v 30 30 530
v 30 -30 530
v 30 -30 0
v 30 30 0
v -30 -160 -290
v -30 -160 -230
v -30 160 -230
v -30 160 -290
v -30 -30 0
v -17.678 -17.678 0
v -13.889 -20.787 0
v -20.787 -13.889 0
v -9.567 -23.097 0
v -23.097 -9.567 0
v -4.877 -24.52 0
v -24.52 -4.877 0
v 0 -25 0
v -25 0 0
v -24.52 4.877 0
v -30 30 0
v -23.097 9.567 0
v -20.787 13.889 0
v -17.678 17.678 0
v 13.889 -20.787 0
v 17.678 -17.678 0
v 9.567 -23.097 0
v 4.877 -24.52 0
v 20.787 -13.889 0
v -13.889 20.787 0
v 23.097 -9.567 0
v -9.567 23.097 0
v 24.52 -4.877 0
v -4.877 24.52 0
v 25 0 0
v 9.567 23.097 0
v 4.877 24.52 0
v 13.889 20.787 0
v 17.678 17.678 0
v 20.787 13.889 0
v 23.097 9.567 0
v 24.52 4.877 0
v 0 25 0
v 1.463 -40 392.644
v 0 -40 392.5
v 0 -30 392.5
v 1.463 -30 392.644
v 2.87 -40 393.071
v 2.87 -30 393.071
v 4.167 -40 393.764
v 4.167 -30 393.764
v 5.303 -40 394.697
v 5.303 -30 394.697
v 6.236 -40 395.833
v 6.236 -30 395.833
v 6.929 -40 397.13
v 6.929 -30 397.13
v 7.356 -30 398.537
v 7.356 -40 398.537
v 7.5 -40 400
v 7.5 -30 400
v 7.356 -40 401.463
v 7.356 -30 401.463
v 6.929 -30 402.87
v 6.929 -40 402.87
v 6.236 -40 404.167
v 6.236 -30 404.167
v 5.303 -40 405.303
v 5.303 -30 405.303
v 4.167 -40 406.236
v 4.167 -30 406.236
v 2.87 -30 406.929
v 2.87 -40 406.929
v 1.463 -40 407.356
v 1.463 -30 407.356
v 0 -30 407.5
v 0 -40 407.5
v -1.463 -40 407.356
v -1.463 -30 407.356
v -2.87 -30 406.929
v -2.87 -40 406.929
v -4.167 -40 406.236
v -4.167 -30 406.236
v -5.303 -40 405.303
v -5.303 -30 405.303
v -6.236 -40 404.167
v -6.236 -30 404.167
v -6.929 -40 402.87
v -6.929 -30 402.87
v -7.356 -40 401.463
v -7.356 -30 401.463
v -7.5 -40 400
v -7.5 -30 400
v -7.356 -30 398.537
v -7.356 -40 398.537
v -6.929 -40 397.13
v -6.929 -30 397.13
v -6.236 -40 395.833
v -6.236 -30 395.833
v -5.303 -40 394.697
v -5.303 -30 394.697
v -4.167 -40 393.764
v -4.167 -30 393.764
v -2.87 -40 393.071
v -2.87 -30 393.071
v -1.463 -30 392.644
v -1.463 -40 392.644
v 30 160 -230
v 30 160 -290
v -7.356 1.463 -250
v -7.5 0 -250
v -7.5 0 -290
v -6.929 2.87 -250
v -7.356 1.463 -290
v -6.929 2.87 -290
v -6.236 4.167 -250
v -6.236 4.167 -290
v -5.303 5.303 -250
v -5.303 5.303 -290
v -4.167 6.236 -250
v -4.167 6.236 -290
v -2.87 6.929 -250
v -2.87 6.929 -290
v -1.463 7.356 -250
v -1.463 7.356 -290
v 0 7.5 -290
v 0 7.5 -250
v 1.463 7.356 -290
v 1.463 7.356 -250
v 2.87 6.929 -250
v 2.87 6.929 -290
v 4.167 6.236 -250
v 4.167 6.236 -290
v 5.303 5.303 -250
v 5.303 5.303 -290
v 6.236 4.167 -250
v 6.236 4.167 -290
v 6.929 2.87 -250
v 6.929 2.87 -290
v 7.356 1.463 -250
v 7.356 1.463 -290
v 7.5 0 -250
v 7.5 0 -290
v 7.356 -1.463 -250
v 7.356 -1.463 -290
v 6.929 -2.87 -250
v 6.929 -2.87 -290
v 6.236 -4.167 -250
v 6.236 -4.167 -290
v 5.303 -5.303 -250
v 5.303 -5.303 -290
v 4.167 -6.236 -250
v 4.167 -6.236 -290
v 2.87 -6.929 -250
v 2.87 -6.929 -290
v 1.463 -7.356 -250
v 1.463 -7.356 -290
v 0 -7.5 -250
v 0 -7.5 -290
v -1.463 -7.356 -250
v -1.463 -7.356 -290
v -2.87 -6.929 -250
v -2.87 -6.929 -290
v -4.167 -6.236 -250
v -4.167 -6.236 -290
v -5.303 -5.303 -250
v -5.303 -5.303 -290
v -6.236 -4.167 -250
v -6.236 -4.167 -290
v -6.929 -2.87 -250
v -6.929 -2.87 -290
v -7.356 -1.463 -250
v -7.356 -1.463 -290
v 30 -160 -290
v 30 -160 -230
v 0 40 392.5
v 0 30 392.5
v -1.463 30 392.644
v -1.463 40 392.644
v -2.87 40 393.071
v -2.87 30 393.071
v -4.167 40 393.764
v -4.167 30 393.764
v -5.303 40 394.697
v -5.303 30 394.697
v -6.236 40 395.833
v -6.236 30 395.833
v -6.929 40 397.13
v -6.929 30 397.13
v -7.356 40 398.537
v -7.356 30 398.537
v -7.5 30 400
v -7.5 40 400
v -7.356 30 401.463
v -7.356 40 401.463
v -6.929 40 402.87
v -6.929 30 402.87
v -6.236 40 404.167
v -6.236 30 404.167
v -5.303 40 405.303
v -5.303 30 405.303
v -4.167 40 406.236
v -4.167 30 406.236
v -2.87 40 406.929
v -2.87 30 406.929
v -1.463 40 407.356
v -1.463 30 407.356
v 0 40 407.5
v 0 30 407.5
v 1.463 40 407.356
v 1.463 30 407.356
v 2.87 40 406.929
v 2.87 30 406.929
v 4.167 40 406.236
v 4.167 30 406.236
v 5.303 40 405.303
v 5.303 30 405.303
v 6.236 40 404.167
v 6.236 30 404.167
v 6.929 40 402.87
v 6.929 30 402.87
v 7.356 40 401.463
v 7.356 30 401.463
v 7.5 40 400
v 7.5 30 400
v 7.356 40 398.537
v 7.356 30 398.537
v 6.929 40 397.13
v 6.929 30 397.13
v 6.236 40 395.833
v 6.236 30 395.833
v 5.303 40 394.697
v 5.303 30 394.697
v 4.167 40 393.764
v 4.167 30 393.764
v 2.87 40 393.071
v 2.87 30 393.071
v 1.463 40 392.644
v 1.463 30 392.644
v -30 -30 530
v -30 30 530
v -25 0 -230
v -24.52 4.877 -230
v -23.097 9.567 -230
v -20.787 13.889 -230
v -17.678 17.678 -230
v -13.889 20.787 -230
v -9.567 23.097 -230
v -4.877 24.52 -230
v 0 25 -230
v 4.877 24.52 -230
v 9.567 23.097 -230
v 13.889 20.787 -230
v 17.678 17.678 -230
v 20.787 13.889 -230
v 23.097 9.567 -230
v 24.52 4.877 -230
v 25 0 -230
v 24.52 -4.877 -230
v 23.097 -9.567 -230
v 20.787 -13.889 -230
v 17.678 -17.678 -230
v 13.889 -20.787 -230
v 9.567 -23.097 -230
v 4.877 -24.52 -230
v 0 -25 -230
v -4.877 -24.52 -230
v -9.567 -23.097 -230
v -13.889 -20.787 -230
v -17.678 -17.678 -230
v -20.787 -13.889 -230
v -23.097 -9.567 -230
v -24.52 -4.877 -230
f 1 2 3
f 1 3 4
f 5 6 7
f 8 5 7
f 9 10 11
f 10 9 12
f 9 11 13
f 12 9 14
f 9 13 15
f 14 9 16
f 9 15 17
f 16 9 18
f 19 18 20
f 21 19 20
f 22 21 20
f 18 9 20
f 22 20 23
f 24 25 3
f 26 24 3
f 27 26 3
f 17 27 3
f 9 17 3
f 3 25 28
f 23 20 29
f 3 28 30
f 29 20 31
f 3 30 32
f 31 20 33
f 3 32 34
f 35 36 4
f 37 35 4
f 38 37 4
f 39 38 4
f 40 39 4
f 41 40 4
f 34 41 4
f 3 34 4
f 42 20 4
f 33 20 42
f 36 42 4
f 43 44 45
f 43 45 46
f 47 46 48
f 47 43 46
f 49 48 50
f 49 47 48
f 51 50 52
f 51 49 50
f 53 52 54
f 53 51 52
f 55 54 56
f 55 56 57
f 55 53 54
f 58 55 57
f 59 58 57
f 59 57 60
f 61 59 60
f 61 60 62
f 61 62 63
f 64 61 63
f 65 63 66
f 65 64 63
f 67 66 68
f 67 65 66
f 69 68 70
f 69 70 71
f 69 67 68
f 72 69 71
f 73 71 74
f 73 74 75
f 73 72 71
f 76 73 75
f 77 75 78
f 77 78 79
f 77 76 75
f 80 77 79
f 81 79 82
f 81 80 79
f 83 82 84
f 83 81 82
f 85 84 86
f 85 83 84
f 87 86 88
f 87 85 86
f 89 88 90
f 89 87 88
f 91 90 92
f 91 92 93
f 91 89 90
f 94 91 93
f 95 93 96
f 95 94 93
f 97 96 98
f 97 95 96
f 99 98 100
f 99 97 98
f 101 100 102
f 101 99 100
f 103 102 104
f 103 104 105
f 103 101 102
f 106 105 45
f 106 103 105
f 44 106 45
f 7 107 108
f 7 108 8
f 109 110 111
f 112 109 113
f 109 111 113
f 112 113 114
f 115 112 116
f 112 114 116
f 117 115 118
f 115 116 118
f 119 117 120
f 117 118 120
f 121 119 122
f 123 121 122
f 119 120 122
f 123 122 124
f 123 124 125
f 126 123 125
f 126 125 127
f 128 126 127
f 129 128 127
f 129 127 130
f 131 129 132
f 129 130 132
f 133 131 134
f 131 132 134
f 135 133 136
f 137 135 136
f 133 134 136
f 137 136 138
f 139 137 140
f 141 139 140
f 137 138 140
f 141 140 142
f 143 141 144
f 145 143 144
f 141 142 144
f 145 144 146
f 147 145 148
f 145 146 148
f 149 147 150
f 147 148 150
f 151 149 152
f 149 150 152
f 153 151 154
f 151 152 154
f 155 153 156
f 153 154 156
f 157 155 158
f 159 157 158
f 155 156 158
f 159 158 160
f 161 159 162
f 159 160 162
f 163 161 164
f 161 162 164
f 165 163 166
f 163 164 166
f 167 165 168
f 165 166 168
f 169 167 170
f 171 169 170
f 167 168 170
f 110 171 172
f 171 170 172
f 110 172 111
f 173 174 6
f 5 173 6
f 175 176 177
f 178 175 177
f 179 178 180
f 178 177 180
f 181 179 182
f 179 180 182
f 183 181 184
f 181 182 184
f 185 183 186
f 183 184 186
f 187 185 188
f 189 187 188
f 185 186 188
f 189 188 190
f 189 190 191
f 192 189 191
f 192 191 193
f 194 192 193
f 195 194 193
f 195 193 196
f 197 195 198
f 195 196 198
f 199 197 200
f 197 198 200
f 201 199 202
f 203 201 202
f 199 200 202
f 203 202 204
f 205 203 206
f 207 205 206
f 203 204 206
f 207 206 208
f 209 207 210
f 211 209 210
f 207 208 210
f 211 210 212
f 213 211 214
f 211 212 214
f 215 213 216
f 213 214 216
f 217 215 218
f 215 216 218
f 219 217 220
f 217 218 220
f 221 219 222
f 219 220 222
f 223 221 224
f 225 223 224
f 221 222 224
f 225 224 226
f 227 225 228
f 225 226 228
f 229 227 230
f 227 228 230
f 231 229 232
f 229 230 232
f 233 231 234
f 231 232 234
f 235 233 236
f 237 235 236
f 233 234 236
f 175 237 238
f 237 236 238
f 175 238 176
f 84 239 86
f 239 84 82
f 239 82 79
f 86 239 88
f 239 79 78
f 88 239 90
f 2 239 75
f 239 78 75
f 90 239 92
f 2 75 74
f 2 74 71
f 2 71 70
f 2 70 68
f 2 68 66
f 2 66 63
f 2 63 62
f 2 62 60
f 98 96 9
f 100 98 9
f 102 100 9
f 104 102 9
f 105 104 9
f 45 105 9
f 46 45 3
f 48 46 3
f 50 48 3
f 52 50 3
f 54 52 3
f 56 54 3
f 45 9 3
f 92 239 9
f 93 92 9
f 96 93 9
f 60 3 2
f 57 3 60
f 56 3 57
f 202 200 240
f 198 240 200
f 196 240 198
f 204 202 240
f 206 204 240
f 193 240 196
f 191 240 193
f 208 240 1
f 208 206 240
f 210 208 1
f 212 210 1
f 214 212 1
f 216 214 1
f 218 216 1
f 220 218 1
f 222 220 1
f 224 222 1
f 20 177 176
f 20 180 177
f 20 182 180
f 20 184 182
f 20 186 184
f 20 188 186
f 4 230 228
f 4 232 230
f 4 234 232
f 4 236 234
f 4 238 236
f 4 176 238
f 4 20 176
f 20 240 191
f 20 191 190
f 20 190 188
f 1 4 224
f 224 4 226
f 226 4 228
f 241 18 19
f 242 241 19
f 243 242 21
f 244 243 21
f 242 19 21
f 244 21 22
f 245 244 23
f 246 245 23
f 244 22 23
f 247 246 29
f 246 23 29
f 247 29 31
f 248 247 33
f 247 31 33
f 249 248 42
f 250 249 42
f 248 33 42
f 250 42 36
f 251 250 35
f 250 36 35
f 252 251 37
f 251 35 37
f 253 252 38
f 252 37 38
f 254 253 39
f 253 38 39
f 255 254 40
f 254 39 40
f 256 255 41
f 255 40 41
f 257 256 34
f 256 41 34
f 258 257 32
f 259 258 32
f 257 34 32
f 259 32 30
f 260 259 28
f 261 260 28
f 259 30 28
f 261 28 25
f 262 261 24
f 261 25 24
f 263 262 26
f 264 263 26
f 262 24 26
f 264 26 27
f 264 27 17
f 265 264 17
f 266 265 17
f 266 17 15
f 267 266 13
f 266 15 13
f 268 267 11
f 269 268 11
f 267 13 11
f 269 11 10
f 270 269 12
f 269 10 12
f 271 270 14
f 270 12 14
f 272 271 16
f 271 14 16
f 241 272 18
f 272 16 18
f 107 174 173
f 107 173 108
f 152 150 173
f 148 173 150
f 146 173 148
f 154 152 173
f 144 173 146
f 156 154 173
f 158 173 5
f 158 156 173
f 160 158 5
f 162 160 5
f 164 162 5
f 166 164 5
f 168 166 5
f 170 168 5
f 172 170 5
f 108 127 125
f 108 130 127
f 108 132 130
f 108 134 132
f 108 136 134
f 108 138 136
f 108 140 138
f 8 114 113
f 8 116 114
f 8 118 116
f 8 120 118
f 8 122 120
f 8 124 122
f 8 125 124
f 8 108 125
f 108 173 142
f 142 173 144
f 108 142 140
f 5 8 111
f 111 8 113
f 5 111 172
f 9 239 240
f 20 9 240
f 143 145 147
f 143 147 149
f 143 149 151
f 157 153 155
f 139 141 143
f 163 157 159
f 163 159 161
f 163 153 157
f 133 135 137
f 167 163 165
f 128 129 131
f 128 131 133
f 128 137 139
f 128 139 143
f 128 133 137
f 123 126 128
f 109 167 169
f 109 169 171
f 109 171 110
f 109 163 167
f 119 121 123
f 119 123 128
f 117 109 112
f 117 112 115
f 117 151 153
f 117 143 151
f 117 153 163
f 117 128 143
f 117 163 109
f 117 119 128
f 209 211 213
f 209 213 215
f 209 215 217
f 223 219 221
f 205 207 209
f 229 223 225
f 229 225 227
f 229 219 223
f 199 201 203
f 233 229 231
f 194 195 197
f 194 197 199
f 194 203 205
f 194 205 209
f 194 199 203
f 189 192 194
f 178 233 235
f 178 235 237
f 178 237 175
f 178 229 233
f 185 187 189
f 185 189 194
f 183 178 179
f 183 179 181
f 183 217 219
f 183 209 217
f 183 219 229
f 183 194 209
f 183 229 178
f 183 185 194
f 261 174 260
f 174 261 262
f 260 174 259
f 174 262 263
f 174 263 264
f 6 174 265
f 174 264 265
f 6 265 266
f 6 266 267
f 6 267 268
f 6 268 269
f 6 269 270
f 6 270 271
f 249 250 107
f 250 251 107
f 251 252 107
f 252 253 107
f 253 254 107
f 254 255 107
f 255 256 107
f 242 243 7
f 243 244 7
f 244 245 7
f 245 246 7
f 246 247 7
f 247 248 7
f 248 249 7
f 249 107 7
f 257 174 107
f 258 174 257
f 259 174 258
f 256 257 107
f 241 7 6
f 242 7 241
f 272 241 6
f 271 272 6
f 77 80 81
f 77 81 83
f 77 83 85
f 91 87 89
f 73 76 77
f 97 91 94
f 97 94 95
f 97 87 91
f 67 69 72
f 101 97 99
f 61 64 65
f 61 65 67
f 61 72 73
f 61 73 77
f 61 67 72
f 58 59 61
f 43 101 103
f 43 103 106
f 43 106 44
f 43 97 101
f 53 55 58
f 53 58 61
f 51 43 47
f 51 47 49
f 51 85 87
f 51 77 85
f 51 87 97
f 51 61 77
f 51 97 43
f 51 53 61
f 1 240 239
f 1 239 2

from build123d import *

# Parameters (mm, degrees)
SKETCH_1_W          = 60
SKETCH_1_H          = 60
EXTRUDE_1_DEPTH     = 530
SKETCH_2_R          = 25
EXTRUDE_2_DEPTH     = 230
SKETCH_3_R          = 7.5
EXTRUDE_3_DEPTH     = 10
EXTRUDE_START       = 10
SKETCH_4_R          = 7.5
EXTRUDE_4_DEPTH     = 10
SKETCH_5_W          = 60
SKETCH_5_H          = 320
EXTRUDE_5_DEPTH     = 60
SKETCH_6_R          = 7.5
CUT_EXTRUDE_1_DEPTH = 40


with BuildPart() as part:
    # 草图1 → 凸台-拉伸1 (new body)
    with BuildSketch(Plane.XY):
        Rectangle(SKETCH_1_W, SKETCH_1_H)
    extrude(amount=EXTRUDE_1_DEPTH)

    # 草图2 → 凸台-拉伸2 (add)
    with BuildSketch(Plane(origin=(0, 0, 0), x_dir=(-1, 0, 0), z_dir=(0, 0, -1))):
        Circle(SKETCH_2_R)
    extrude(amount=EXTRUDE_2_DEPTH)

    # 草图3 → 凸台-拉伸3 (add)
    with BuildSketch(Plane(origin=(0, 30, 0), x_dir=(1, 0, 0), z_dir=(0, 1, 0))):
        with Locations(Location((0, -400, 0), (0, 0, 90))):
            Circle(SKETCH_3_R)
    extrude(amount=EXTRUDE_3_DEPTH)

    # 草图4 → 凸台-拉伸4 (add)
    with BuildSketch(Plane.XZ.offset(30).offset(EXTRUDE_START)):
        with Locations(Location((0, 400, 0), (0, 0, 270))):
            Circle(SKETCH_4_R)
    extrude(amount=-EXTRUDE_4_DEPTH)

    # 草图5 → 凸台-拉伸5 (add)
    with BuildSketch(Plane(origin=(0, 0, -230), x_dir=(-1, 0, 0), z_dir=(0, 0, -1))):
        Rectangle(SKETCH_5_W, SKETCH_5_H)
    extrude(amount=EXTRUDE_5_DEPTH)

    # 草图6 → 切除-拉伸1 (cut)
    with BuildSketch(Plane(origin=(0, 0, -290), x_dir=(-1, 0, 0), z_dir=(0, 0, -1))):
        Circle(SKETCH_6_R)
    extrude(amount=-CUT_EXTRUDE_1_DEPTH, mode=Mode.SUBTRACT)


solid = part.part
